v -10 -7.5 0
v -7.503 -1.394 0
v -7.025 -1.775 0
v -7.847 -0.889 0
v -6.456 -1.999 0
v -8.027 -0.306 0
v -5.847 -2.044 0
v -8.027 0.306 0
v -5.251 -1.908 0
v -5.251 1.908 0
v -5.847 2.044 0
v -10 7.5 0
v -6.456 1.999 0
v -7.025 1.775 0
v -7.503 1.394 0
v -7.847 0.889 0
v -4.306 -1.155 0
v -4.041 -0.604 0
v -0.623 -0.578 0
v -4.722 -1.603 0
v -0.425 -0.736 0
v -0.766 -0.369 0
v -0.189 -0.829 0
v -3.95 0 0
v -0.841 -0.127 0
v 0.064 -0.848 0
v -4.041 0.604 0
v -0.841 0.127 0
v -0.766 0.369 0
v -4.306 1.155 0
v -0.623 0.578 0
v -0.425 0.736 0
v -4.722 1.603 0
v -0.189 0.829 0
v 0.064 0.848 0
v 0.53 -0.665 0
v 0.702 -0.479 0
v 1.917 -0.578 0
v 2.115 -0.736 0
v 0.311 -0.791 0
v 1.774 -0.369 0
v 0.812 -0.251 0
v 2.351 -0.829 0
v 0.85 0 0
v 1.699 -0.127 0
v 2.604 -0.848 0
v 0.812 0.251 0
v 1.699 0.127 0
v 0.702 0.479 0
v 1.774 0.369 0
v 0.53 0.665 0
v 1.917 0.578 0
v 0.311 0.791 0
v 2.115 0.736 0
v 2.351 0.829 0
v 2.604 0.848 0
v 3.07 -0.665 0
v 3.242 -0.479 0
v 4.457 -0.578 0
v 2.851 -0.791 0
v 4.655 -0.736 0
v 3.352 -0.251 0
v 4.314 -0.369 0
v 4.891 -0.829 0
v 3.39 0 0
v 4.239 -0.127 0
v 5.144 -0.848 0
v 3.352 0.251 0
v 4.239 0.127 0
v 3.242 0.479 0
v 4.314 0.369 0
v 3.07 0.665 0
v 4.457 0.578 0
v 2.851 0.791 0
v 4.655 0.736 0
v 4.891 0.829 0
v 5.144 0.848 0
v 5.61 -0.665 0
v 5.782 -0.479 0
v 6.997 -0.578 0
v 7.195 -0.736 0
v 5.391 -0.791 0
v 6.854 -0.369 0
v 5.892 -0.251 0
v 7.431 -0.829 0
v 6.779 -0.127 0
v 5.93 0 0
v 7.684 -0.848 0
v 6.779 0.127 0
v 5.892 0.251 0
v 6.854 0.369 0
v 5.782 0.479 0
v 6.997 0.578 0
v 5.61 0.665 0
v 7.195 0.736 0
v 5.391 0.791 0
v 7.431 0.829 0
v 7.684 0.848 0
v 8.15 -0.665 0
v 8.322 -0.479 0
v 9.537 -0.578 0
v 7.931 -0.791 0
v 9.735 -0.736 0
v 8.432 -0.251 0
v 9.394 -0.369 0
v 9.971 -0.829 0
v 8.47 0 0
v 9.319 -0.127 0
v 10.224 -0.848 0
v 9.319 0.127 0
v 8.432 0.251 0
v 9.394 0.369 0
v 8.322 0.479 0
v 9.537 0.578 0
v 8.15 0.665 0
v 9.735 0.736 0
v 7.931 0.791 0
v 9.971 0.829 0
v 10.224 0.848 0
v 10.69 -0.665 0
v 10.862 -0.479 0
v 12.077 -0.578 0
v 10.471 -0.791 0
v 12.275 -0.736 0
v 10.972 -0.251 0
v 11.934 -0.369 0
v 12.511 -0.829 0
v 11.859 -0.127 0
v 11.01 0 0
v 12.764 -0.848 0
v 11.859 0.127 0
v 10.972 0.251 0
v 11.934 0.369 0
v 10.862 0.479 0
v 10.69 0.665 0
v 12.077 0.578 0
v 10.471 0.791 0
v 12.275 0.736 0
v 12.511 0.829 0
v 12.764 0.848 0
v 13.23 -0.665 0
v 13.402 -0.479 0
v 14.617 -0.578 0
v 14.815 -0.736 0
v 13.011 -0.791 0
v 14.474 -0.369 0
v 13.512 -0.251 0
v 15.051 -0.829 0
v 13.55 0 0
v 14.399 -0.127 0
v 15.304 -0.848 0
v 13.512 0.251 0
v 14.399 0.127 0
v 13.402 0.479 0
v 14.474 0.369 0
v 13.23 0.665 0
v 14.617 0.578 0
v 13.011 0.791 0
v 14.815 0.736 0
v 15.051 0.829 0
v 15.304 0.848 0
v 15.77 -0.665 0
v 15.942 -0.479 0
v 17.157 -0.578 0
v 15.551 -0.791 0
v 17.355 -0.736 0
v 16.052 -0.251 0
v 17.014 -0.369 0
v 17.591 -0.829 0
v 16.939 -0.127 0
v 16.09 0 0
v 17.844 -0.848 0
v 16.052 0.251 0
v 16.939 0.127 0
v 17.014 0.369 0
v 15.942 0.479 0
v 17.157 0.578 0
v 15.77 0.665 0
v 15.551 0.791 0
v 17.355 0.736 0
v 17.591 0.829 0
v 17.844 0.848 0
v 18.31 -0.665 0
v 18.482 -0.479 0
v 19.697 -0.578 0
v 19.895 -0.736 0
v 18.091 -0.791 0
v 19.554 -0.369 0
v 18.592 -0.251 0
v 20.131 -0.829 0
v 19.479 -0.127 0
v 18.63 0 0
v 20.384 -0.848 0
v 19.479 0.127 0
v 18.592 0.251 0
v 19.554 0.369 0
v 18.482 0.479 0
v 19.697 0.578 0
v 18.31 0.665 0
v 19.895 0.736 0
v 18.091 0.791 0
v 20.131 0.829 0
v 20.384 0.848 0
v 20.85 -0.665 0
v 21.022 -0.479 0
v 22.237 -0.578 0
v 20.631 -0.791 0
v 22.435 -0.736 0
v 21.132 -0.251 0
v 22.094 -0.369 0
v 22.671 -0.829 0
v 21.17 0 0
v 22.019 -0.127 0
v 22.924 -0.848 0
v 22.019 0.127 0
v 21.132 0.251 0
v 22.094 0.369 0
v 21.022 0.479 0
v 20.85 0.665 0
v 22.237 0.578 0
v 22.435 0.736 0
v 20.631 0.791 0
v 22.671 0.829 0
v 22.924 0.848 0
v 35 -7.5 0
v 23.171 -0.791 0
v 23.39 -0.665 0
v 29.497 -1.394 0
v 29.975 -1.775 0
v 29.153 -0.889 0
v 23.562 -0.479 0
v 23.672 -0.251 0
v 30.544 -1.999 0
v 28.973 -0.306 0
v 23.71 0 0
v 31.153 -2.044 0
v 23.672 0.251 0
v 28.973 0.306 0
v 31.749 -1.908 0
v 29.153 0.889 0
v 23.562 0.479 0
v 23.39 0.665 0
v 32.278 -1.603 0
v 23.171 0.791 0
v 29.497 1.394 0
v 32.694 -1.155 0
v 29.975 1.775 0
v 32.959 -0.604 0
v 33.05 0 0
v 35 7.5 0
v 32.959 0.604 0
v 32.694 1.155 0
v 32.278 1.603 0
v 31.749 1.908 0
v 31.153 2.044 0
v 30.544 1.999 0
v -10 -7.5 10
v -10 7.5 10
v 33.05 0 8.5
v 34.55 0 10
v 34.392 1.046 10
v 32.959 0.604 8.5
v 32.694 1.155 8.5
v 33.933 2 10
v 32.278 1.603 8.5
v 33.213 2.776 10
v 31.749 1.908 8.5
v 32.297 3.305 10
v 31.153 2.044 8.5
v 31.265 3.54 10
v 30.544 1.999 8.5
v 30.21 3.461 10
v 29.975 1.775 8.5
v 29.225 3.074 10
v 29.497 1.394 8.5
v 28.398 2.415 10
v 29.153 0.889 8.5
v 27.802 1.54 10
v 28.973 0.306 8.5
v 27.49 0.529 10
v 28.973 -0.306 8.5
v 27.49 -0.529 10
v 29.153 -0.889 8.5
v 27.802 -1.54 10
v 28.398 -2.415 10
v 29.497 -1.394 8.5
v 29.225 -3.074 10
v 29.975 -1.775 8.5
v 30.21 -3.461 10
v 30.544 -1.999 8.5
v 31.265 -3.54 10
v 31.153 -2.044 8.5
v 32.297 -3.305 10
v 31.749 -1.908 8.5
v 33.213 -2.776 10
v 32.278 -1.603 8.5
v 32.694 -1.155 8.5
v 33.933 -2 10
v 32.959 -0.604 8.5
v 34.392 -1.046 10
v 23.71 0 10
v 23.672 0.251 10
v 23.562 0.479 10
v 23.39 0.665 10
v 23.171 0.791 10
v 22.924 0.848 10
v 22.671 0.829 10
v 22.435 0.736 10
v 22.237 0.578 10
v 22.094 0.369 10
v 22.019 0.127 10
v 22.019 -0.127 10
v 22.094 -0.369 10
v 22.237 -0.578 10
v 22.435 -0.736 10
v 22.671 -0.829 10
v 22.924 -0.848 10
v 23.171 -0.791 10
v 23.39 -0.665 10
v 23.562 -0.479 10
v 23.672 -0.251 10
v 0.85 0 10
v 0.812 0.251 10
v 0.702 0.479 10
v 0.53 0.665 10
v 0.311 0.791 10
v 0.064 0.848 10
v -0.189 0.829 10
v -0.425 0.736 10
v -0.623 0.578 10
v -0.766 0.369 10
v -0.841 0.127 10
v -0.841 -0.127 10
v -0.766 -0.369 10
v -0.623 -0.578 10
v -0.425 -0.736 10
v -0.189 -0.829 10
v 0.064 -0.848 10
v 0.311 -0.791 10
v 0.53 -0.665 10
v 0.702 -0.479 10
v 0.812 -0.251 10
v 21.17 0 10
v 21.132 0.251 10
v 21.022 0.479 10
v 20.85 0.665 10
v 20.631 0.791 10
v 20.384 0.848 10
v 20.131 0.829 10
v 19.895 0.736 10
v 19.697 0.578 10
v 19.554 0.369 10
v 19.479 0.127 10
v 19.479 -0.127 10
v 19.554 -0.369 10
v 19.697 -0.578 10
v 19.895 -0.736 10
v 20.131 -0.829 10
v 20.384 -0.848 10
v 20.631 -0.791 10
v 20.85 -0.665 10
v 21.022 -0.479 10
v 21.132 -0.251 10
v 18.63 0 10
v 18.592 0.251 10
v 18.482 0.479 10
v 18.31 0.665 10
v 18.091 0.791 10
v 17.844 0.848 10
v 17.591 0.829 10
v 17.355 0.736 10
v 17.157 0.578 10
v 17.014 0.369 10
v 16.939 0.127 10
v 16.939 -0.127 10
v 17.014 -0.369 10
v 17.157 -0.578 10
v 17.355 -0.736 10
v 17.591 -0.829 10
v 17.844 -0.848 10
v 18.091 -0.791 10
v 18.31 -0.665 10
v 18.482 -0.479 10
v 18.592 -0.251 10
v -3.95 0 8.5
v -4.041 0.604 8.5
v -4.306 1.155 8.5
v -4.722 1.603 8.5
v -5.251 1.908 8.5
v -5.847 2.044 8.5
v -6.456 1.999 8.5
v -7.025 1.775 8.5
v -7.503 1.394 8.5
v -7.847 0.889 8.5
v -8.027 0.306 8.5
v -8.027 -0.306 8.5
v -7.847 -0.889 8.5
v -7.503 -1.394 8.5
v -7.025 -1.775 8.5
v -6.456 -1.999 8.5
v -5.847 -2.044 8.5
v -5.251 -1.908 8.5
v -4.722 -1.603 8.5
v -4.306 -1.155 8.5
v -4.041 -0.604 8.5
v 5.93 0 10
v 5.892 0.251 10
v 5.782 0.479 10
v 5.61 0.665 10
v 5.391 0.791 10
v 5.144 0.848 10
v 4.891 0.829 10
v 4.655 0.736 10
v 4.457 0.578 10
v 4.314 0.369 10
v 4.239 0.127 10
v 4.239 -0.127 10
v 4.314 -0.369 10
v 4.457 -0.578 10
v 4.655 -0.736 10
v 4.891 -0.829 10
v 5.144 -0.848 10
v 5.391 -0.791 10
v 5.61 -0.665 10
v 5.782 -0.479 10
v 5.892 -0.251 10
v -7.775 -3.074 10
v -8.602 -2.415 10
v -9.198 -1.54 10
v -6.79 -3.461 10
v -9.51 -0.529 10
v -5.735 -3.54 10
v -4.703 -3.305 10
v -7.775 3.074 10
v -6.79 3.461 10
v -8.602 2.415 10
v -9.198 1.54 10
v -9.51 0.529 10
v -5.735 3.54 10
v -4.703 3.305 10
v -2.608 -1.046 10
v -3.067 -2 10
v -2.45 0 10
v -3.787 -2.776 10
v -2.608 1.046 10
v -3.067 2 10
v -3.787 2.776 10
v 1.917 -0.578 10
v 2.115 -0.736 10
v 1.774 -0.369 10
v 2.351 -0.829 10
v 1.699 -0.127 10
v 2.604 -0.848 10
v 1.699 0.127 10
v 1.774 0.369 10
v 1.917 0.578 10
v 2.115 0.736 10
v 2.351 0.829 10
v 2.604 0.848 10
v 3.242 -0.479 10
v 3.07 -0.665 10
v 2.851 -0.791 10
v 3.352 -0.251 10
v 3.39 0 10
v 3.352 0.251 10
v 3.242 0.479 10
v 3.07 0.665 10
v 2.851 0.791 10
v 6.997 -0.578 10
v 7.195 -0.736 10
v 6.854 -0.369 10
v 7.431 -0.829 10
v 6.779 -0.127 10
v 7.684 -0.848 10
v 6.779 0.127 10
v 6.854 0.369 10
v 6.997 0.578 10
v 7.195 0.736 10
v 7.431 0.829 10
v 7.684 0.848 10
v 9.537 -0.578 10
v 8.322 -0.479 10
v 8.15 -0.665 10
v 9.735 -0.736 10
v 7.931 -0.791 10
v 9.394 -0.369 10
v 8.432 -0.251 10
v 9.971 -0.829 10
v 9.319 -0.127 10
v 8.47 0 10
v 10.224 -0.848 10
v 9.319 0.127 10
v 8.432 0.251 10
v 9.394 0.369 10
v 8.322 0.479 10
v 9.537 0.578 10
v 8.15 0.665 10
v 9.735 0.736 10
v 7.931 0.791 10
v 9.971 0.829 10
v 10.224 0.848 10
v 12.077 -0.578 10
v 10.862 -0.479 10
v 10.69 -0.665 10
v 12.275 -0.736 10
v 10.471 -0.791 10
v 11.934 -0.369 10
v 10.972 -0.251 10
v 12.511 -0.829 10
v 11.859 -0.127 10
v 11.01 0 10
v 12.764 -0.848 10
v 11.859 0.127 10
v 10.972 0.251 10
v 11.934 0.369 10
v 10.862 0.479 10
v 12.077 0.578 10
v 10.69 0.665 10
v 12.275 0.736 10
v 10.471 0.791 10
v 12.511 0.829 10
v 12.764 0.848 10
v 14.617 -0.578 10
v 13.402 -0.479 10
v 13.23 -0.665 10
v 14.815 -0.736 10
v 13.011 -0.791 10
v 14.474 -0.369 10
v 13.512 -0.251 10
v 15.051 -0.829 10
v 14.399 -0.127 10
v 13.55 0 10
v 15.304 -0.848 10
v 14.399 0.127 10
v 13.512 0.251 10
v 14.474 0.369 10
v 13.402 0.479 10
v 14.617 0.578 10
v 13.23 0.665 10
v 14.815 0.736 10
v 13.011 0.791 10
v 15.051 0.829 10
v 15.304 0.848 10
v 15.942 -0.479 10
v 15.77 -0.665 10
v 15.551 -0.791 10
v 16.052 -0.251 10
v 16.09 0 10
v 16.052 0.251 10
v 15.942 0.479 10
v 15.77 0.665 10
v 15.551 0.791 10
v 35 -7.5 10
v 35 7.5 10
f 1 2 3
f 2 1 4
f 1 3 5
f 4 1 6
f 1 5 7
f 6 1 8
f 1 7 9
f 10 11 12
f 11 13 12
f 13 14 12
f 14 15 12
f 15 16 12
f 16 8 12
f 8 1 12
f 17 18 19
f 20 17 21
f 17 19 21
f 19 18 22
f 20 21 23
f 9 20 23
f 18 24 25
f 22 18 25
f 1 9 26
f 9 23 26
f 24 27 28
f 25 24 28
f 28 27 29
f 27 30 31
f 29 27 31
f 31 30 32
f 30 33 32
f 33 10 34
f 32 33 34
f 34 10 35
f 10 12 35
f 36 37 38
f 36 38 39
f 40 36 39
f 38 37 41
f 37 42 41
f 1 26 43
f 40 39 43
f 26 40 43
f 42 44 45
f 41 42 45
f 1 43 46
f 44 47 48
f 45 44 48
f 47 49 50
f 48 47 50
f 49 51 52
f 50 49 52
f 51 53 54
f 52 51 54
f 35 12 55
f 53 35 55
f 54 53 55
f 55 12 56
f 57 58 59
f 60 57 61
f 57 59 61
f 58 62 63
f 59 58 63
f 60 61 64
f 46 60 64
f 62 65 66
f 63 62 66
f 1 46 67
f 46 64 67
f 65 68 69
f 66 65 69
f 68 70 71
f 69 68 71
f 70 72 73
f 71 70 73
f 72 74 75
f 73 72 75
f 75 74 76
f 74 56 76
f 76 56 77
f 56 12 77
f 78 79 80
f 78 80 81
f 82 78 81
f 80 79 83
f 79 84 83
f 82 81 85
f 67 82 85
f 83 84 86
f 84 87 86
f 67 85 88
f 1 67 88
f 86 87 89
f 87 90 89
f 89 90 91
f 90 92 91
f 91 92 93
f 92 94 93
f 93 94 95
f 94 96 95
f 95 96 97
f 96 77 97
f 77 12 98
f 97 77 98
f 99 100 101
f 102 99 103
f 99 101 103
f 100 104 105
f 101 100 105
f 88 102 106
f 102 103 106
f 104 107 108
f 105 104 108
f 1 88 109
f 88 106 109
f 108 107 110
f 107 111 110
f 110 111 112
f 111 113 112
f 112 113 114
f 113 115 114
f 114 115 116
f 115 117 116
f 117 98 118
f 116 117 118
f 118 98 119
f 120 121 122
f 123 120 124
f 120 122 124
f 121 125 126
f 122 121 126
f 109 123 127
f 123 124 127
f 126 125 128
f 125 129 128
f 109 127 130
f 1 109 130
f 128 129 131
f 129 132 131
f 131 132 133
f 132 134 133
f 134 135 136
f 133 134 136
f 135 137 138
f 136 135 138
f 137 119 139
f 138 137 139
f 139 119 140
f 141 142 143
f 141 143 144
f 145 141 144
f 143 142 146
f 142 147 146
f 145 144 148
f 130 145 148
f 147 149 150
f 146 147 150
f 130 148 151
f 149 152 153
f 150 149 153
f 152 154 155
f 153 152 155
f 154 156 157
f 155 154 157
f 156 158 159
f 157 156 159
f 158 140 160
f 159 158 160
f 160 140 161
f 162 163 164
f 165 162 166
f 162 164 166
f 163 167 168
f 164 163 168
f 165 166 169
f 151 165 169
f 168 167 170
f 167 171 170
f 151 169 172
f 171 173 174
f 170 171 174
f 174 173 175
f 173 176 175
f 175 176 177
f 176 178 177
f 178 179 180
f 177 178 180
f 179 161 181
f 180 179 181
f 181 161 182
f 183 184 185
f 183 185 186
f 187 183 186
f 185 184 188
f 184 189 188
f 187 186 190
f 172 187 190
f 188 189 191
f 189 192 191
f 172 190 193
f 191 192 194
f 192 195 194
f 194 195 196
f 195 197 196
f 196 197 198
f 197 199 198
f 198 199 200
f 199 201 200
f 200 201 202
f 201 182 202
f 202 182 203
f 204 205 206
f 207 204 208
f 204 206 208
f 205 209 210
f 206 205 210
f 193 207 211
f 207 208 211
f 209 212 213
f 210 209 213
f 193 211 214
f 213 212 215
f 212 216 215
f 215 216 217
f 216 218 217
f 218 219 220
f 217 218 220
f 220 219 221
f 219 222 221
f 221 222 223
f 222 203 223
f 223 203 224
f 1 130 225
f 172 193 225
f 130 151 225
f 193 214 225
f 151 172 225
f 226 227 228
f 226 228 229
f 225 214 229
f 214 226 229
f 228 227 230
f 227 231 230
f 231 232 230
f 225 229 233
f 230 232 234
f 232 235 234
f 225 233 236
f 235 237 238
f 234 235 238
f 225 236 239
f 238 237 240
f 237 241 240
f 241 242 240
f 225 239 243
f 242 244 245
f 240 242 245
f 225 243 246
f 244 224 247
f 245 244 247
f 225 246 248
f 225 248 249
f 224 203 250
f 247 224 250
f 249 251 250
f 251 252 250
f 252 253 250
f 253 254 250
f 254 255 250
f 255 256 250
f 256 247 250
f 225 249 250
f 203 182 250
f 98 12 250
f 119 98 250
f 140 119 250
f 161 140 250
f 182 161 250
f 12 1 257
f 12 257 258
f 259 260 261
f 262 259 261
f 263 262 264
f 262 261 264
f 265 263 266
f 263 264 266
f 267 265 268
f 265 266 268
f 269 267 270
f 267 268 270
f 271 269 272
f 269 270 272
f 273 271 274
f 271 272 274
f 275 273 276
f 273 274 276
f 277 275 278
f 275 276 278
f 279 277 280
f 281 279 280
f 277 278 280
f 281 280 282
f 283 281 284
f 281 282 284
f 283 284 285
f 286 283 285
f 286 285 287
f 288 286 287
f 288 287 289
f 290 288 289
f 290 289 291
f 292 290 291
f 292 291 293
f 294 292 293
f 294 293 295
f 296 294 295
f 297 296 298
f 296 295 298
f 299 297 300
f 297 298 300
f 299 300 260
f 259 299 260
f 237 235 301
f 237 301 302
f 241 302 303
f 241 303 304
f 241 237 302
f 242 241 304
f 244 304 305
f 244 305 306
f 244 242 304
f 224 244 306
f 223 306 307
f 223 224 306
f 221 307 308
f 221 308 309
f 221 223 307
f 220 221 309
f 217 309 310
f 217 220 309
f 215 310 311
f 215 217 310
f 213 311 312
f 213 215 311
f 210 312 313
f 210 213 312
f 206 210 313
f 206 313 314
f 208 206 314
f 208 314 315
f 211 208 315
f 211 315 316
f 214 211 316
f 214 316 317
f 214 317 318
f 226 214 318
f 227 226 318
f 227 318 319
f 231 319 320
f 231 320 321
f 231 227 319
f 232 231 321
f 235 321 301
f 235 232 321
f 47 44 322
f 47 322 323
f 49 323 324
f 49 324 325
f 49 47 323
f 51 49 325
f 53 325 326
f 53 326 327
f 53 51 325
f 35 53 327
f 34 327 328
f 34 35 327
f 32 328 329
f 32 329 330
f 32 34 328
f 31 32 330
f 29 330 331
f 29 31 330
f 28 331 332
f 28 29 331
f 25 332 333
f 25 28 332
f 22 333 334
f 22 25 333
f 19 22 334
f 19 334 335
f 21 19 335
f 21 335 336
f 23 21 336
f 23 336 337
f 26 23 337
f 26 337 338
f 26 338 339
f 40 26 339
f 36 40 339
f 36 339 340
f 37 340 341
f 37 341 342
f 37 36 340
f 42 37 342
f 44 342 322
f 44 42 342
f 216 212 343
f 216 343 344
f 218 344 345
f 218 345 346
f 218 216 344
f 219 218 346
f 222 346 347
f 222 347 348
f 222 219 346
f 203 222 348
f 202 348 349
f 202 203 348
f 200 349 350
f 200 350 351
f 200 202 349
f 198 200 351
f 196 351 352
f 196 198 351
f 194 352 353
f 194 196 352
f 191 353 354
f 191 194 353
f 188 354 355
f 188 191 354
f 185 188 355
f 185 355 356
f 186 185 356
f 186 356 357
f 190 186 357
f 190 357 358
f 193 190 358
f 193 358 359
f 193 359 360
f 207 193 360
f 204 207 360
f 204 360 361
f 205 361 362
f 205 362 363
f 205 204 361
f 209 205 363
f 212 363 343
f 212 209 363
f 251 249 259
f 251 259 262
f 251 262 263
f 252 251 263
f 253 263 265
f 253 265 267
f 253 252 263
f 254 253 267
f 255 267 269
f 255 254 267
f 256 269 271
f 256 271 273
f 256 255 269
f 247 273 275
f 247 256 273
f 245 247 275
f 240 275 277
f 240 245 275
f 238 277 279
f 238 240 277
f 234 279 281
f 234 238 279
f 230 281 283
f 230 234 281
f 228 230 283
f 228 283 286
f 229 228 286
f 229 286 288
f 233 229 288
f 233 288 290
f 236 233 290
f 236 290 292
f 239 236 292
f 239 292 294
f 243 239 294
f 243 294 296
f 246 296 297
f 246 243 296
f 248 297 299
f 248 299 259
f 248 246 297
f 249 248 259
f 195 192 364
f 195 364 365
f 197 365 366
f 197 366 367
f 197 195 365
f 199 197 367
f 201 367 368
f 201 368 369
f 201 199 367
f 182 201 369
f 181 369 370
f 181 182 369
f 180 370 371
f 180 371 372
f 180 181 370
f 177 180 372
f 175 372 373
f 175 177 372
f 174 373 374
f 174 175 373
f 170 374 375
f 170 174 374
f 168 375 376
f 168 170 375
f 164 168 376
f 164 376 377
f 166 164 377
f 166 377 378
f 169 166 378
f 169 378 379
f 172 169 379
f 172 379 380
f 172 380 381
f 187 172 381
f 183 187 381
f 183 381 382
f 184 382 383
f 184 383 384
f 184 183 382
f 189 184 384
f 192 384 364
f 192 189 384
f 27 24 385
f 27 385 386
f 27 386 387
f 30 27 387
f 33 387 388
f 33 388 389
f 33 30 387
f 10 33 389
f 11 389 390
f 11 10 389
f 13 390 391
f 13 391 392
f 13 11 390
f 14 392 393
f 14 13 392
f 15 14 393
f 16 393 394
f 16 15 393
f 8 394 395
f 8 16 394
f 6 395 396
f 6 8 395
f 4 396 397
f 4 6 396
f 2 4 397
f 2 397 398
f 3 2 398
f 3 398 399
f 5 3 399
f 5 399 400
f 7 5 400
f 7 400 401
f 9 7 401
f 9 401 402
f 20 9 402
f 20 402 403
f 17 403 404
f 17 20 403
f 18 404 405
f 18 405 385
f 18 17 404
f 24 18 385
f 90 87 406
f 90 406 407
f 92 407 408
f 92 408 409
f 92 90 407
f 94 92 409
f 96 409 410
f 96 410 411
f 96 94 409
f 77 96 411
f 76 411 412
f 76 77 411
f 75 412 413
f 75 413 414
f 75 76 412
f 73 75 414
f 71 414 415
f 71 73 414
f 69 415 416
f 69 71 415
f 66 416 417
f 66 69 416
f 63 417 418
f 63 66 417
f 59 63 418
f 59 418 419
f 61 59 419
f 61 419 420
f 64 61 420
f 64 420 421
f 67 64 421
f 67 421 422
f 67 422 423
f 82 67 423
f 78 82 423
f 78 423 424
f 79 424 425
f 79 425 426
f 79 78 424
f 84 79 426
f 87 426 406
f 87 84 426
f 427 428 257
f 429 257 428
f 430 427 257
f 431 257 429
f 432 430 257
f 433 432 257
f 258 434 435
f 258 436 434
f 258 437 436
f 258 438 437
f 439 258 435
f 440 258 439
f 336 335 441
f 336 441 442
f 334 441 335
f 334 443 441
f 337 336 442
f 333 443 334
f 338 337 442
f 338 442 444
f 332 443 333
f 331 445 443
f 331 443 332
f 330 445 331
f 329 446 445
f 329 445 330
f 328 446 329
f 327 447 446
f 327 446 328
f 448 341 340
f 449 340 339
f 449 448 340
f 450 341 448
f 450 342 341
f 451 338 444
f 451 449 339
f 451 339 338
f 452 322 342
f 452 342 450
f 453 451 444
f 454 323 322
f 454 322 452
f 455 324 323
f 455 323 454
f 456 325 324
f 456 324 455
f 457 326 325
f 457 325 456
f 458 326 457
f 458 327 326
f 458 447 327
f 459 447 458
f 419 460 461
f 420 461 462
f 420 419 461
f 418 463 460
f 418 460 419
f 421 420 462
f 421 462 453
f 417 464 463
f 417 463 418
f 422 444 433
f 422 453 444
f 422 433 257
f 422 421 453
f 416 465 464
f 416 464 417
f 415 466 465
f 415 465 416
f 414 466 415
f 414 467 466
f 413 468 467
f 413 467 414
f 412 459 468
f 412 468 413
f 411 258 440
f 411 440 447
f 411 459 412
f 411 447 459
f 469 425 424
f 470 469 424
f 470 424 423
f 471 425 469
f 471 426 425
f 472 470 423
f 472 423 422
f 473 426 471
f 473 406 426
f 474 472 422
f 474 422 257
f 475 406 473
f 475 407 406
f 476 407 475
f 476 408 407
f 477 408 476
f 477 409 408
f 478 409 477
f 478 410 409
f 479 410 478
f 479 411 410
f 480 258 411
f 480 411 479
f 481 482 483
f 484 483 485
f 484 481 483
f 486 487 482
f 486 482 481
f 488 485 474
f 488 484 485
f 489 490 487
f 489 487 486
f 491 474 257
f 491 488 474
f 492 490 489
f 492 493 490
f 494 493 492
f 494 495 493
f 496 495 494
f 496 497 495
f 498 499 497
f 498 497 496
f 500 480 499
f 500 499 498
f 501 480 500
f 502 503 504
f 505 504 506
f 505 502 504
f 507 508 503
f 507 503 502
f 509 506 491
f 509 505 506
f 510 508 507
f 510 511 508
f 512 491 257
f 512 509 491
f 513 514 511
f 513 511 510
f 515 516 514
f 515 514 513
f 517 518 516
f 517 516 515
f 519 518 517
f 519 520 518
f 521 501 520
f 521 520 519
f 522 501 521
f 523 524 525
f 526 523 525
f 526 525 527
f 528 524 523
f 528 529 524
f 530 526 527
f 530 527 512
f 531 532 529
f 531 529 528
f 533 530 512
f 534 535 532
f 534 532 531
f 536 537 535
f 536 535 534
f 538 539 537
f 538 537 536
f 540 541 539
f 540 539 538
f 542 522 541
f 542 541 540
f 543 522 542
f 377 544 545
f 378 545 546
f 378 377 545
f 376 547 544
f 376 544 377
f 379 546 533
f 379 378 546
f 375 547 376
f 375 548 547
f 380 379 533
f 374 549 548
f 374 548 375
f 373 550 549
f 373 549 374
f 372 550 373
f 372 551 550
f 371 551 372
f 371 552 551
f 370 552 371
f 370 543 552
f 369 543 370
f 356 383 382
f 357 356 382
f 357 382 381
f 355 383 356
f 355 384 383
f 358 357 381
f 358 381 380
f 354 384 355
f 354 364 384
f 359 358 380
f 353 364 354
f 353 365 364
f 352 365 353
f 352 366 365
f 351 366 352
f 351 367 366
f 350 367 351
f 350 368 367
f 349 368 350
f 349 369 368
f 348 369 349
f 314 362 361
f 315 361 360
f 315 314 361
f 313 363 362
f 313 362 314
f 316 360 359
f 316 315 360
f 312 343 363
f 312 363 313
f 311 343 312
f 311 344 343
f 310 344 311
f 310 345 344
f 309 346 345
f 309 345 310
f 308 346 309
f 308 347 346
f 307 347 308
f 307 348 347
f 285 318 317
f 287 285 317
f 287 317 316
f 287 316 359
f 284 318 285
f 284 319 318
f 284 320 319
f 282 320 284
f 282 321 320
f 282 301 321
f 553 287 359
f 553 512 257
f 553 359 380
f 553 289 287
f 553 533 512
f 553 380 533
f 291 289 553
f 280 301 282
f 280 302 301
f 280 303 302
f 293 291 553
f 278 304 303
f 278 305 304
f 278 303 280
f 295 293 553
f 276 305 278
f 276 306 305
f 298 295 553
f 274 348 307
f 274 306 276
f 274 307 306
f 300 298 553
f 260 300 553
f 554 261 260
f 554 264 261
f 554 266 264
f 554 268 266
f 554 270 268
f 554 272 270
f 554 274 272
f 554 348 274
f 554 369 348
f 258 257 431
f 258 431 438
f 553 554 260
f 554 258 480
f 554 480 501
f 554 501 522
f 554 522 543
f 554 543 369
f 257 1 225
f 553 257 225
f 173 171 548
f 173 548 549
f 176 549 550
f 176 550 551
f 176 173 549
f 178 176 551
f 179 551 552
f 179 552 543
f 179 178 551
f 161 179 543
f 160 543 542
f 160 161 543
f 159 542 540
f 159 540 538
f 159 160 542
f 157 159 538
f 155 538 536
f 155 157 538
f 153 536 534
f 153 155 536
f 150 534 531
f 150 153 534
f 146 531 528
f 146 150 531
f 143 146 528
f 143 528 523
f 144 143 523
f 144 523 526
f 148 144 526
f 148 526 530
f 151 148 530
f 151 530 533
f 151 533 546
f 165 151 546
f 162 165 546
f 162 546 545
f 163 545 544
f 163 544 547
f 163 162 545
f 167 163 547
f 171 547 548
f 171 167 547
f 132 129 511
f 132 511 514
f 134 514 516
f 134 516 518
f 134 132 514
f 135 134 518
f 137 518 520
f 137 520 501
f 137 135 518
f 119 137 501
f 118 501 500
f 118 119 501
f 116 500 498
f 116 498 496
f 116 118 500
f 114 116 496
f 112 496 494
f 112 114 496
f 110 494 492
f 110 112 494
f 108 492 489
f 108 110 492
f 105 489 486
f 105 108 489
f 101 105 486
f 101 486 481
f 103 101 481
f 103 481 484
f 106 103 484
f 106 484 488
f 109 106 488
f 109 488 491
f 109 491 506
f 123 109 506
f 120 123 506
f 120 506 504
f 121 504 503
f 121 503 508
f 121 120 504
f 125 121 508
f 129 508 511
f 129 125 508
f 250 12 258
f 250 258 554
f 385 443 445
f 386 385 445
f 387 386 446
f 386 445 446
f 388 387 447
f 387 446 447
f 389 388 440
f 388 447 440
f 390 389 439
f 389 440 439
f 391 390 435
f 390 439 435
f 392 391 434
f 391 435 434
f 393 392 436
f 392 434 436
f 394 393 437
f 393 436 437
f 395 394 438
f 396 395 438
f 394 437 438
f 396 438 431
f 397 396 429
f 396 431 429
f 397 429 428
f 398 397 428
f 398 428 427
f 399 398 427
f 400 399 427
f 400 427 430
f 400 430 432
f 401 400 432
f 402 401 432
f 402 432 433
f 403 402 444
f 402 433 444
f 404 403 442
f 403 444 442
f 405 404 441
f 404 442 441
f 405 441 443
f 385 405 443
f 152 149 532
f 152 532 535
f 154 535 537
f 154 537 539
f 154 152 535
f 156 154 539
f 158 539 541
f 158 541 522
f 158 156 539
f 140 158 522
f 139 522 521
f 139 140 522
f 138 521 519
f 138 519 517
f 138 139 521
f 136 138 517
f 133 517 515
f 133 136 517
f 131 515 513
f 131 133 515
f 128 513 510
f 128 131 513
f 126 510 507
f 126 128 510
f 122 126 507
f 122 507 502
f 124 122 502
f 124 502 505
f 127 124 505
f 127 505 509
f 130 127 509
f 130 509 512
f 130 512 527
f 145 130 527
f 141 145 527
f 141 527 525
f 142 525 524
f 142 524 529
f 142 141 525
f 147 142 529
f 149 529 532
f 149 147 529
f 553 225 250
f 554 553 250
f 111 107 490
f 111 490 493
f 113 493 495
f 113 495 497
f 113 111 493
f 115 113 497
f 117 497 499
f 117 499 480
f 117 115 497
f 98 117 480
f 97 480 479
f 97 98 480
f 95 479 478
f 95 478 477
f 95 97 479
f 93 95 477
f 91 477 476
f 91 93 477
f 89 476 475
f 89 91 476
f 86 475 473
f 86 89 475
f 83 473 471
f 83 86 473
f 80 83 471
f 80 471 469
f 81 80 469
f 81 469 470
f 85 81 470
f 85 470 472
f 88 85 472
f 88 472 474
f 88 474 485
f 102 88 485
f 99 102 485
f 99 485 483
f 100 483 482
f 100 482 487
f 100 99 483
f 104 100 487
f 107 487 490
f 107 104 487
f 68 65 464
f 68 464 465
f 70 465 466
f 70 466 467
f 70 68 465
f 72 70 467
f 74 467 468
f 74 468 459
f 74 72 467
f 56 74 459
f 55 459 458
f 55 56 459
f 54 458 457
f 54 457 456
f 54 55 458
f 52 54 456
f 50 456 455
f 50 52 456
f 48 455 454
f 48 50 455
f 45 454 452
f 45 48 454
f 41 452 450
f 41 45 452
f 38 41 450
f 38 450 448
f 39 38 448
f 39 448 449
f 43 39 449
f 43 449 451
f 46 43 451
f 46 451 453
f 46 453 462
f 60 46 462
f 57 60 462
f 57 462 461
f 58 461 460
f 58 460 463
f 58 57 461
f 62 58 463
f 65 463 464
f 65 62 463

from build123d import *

# Parameters (mm, degrees)
F0_W     = 45
F0_H     = 15
F0_R     = 2.05
F0_R_2   = 0.85
F1_DEPTH = 10
F2_SIZE  = 1.5


with BuildPart() as f1:
    # F0 (on Top) → F1 (new body)
    with BuildSketch(Plane.XY):
        with Locations((12.5, 0)):
            Rectangle(F0_W, F0_H)
        with Locations((-6, 0)):
            Circle(F0_R, mode=Mode.SUBTRACT)
        Circle(F0_R_2, mode=Mode.SUBTRACT)
        with Locations((2.54, 0)):
            Circle(F0_R_2, mode=Mode.SUBTRACT)
        with Locations((5.08, 0)):
            Circle(F0_R_2, mode=Mode.SUBTRACT)
        with Locations((7.62, 0)):
            Circle(F0_R_2, mode=Mode.SUBTRACT)
        with Locations((10.16, 0)):
            Circle(F0_R_2, mode=Mode.SUBTRACT)
        with Locations((12.7, 0)):
            Circle(F0_R_2, mode=Mode.SUBTRACT)
        with Locations((15.24, 0)):
            Circle(F0_R_2, mode=Mode.SUBTRACT)
        with Locations((17.78, 0)):
            Circle(F0_R_2, mode=Mode.SUBTRACT)
        with Locations((20.32, 0)):
            Circle(F0_R_2, mode=Mode.SUBTRACT)
        with Locations((22.86, 0)):
            Circle(F0_R_2, mode=Mode.SUBTRACT)
        with Locations((31, 0)):
            Circle(F0_R, mode=Mode.SUBTRACT)
    extrude(amount=F1_DEPTH)

    # F2
    f2_edges = [f1.edges().sort_by_distance(p)[0] for p in [
        (-8.05, 0, 10),
        (28.95, 0, 10),
    ]]
    chamfer(f2_edges, length=F2_SIZE)


solid = f1.part
